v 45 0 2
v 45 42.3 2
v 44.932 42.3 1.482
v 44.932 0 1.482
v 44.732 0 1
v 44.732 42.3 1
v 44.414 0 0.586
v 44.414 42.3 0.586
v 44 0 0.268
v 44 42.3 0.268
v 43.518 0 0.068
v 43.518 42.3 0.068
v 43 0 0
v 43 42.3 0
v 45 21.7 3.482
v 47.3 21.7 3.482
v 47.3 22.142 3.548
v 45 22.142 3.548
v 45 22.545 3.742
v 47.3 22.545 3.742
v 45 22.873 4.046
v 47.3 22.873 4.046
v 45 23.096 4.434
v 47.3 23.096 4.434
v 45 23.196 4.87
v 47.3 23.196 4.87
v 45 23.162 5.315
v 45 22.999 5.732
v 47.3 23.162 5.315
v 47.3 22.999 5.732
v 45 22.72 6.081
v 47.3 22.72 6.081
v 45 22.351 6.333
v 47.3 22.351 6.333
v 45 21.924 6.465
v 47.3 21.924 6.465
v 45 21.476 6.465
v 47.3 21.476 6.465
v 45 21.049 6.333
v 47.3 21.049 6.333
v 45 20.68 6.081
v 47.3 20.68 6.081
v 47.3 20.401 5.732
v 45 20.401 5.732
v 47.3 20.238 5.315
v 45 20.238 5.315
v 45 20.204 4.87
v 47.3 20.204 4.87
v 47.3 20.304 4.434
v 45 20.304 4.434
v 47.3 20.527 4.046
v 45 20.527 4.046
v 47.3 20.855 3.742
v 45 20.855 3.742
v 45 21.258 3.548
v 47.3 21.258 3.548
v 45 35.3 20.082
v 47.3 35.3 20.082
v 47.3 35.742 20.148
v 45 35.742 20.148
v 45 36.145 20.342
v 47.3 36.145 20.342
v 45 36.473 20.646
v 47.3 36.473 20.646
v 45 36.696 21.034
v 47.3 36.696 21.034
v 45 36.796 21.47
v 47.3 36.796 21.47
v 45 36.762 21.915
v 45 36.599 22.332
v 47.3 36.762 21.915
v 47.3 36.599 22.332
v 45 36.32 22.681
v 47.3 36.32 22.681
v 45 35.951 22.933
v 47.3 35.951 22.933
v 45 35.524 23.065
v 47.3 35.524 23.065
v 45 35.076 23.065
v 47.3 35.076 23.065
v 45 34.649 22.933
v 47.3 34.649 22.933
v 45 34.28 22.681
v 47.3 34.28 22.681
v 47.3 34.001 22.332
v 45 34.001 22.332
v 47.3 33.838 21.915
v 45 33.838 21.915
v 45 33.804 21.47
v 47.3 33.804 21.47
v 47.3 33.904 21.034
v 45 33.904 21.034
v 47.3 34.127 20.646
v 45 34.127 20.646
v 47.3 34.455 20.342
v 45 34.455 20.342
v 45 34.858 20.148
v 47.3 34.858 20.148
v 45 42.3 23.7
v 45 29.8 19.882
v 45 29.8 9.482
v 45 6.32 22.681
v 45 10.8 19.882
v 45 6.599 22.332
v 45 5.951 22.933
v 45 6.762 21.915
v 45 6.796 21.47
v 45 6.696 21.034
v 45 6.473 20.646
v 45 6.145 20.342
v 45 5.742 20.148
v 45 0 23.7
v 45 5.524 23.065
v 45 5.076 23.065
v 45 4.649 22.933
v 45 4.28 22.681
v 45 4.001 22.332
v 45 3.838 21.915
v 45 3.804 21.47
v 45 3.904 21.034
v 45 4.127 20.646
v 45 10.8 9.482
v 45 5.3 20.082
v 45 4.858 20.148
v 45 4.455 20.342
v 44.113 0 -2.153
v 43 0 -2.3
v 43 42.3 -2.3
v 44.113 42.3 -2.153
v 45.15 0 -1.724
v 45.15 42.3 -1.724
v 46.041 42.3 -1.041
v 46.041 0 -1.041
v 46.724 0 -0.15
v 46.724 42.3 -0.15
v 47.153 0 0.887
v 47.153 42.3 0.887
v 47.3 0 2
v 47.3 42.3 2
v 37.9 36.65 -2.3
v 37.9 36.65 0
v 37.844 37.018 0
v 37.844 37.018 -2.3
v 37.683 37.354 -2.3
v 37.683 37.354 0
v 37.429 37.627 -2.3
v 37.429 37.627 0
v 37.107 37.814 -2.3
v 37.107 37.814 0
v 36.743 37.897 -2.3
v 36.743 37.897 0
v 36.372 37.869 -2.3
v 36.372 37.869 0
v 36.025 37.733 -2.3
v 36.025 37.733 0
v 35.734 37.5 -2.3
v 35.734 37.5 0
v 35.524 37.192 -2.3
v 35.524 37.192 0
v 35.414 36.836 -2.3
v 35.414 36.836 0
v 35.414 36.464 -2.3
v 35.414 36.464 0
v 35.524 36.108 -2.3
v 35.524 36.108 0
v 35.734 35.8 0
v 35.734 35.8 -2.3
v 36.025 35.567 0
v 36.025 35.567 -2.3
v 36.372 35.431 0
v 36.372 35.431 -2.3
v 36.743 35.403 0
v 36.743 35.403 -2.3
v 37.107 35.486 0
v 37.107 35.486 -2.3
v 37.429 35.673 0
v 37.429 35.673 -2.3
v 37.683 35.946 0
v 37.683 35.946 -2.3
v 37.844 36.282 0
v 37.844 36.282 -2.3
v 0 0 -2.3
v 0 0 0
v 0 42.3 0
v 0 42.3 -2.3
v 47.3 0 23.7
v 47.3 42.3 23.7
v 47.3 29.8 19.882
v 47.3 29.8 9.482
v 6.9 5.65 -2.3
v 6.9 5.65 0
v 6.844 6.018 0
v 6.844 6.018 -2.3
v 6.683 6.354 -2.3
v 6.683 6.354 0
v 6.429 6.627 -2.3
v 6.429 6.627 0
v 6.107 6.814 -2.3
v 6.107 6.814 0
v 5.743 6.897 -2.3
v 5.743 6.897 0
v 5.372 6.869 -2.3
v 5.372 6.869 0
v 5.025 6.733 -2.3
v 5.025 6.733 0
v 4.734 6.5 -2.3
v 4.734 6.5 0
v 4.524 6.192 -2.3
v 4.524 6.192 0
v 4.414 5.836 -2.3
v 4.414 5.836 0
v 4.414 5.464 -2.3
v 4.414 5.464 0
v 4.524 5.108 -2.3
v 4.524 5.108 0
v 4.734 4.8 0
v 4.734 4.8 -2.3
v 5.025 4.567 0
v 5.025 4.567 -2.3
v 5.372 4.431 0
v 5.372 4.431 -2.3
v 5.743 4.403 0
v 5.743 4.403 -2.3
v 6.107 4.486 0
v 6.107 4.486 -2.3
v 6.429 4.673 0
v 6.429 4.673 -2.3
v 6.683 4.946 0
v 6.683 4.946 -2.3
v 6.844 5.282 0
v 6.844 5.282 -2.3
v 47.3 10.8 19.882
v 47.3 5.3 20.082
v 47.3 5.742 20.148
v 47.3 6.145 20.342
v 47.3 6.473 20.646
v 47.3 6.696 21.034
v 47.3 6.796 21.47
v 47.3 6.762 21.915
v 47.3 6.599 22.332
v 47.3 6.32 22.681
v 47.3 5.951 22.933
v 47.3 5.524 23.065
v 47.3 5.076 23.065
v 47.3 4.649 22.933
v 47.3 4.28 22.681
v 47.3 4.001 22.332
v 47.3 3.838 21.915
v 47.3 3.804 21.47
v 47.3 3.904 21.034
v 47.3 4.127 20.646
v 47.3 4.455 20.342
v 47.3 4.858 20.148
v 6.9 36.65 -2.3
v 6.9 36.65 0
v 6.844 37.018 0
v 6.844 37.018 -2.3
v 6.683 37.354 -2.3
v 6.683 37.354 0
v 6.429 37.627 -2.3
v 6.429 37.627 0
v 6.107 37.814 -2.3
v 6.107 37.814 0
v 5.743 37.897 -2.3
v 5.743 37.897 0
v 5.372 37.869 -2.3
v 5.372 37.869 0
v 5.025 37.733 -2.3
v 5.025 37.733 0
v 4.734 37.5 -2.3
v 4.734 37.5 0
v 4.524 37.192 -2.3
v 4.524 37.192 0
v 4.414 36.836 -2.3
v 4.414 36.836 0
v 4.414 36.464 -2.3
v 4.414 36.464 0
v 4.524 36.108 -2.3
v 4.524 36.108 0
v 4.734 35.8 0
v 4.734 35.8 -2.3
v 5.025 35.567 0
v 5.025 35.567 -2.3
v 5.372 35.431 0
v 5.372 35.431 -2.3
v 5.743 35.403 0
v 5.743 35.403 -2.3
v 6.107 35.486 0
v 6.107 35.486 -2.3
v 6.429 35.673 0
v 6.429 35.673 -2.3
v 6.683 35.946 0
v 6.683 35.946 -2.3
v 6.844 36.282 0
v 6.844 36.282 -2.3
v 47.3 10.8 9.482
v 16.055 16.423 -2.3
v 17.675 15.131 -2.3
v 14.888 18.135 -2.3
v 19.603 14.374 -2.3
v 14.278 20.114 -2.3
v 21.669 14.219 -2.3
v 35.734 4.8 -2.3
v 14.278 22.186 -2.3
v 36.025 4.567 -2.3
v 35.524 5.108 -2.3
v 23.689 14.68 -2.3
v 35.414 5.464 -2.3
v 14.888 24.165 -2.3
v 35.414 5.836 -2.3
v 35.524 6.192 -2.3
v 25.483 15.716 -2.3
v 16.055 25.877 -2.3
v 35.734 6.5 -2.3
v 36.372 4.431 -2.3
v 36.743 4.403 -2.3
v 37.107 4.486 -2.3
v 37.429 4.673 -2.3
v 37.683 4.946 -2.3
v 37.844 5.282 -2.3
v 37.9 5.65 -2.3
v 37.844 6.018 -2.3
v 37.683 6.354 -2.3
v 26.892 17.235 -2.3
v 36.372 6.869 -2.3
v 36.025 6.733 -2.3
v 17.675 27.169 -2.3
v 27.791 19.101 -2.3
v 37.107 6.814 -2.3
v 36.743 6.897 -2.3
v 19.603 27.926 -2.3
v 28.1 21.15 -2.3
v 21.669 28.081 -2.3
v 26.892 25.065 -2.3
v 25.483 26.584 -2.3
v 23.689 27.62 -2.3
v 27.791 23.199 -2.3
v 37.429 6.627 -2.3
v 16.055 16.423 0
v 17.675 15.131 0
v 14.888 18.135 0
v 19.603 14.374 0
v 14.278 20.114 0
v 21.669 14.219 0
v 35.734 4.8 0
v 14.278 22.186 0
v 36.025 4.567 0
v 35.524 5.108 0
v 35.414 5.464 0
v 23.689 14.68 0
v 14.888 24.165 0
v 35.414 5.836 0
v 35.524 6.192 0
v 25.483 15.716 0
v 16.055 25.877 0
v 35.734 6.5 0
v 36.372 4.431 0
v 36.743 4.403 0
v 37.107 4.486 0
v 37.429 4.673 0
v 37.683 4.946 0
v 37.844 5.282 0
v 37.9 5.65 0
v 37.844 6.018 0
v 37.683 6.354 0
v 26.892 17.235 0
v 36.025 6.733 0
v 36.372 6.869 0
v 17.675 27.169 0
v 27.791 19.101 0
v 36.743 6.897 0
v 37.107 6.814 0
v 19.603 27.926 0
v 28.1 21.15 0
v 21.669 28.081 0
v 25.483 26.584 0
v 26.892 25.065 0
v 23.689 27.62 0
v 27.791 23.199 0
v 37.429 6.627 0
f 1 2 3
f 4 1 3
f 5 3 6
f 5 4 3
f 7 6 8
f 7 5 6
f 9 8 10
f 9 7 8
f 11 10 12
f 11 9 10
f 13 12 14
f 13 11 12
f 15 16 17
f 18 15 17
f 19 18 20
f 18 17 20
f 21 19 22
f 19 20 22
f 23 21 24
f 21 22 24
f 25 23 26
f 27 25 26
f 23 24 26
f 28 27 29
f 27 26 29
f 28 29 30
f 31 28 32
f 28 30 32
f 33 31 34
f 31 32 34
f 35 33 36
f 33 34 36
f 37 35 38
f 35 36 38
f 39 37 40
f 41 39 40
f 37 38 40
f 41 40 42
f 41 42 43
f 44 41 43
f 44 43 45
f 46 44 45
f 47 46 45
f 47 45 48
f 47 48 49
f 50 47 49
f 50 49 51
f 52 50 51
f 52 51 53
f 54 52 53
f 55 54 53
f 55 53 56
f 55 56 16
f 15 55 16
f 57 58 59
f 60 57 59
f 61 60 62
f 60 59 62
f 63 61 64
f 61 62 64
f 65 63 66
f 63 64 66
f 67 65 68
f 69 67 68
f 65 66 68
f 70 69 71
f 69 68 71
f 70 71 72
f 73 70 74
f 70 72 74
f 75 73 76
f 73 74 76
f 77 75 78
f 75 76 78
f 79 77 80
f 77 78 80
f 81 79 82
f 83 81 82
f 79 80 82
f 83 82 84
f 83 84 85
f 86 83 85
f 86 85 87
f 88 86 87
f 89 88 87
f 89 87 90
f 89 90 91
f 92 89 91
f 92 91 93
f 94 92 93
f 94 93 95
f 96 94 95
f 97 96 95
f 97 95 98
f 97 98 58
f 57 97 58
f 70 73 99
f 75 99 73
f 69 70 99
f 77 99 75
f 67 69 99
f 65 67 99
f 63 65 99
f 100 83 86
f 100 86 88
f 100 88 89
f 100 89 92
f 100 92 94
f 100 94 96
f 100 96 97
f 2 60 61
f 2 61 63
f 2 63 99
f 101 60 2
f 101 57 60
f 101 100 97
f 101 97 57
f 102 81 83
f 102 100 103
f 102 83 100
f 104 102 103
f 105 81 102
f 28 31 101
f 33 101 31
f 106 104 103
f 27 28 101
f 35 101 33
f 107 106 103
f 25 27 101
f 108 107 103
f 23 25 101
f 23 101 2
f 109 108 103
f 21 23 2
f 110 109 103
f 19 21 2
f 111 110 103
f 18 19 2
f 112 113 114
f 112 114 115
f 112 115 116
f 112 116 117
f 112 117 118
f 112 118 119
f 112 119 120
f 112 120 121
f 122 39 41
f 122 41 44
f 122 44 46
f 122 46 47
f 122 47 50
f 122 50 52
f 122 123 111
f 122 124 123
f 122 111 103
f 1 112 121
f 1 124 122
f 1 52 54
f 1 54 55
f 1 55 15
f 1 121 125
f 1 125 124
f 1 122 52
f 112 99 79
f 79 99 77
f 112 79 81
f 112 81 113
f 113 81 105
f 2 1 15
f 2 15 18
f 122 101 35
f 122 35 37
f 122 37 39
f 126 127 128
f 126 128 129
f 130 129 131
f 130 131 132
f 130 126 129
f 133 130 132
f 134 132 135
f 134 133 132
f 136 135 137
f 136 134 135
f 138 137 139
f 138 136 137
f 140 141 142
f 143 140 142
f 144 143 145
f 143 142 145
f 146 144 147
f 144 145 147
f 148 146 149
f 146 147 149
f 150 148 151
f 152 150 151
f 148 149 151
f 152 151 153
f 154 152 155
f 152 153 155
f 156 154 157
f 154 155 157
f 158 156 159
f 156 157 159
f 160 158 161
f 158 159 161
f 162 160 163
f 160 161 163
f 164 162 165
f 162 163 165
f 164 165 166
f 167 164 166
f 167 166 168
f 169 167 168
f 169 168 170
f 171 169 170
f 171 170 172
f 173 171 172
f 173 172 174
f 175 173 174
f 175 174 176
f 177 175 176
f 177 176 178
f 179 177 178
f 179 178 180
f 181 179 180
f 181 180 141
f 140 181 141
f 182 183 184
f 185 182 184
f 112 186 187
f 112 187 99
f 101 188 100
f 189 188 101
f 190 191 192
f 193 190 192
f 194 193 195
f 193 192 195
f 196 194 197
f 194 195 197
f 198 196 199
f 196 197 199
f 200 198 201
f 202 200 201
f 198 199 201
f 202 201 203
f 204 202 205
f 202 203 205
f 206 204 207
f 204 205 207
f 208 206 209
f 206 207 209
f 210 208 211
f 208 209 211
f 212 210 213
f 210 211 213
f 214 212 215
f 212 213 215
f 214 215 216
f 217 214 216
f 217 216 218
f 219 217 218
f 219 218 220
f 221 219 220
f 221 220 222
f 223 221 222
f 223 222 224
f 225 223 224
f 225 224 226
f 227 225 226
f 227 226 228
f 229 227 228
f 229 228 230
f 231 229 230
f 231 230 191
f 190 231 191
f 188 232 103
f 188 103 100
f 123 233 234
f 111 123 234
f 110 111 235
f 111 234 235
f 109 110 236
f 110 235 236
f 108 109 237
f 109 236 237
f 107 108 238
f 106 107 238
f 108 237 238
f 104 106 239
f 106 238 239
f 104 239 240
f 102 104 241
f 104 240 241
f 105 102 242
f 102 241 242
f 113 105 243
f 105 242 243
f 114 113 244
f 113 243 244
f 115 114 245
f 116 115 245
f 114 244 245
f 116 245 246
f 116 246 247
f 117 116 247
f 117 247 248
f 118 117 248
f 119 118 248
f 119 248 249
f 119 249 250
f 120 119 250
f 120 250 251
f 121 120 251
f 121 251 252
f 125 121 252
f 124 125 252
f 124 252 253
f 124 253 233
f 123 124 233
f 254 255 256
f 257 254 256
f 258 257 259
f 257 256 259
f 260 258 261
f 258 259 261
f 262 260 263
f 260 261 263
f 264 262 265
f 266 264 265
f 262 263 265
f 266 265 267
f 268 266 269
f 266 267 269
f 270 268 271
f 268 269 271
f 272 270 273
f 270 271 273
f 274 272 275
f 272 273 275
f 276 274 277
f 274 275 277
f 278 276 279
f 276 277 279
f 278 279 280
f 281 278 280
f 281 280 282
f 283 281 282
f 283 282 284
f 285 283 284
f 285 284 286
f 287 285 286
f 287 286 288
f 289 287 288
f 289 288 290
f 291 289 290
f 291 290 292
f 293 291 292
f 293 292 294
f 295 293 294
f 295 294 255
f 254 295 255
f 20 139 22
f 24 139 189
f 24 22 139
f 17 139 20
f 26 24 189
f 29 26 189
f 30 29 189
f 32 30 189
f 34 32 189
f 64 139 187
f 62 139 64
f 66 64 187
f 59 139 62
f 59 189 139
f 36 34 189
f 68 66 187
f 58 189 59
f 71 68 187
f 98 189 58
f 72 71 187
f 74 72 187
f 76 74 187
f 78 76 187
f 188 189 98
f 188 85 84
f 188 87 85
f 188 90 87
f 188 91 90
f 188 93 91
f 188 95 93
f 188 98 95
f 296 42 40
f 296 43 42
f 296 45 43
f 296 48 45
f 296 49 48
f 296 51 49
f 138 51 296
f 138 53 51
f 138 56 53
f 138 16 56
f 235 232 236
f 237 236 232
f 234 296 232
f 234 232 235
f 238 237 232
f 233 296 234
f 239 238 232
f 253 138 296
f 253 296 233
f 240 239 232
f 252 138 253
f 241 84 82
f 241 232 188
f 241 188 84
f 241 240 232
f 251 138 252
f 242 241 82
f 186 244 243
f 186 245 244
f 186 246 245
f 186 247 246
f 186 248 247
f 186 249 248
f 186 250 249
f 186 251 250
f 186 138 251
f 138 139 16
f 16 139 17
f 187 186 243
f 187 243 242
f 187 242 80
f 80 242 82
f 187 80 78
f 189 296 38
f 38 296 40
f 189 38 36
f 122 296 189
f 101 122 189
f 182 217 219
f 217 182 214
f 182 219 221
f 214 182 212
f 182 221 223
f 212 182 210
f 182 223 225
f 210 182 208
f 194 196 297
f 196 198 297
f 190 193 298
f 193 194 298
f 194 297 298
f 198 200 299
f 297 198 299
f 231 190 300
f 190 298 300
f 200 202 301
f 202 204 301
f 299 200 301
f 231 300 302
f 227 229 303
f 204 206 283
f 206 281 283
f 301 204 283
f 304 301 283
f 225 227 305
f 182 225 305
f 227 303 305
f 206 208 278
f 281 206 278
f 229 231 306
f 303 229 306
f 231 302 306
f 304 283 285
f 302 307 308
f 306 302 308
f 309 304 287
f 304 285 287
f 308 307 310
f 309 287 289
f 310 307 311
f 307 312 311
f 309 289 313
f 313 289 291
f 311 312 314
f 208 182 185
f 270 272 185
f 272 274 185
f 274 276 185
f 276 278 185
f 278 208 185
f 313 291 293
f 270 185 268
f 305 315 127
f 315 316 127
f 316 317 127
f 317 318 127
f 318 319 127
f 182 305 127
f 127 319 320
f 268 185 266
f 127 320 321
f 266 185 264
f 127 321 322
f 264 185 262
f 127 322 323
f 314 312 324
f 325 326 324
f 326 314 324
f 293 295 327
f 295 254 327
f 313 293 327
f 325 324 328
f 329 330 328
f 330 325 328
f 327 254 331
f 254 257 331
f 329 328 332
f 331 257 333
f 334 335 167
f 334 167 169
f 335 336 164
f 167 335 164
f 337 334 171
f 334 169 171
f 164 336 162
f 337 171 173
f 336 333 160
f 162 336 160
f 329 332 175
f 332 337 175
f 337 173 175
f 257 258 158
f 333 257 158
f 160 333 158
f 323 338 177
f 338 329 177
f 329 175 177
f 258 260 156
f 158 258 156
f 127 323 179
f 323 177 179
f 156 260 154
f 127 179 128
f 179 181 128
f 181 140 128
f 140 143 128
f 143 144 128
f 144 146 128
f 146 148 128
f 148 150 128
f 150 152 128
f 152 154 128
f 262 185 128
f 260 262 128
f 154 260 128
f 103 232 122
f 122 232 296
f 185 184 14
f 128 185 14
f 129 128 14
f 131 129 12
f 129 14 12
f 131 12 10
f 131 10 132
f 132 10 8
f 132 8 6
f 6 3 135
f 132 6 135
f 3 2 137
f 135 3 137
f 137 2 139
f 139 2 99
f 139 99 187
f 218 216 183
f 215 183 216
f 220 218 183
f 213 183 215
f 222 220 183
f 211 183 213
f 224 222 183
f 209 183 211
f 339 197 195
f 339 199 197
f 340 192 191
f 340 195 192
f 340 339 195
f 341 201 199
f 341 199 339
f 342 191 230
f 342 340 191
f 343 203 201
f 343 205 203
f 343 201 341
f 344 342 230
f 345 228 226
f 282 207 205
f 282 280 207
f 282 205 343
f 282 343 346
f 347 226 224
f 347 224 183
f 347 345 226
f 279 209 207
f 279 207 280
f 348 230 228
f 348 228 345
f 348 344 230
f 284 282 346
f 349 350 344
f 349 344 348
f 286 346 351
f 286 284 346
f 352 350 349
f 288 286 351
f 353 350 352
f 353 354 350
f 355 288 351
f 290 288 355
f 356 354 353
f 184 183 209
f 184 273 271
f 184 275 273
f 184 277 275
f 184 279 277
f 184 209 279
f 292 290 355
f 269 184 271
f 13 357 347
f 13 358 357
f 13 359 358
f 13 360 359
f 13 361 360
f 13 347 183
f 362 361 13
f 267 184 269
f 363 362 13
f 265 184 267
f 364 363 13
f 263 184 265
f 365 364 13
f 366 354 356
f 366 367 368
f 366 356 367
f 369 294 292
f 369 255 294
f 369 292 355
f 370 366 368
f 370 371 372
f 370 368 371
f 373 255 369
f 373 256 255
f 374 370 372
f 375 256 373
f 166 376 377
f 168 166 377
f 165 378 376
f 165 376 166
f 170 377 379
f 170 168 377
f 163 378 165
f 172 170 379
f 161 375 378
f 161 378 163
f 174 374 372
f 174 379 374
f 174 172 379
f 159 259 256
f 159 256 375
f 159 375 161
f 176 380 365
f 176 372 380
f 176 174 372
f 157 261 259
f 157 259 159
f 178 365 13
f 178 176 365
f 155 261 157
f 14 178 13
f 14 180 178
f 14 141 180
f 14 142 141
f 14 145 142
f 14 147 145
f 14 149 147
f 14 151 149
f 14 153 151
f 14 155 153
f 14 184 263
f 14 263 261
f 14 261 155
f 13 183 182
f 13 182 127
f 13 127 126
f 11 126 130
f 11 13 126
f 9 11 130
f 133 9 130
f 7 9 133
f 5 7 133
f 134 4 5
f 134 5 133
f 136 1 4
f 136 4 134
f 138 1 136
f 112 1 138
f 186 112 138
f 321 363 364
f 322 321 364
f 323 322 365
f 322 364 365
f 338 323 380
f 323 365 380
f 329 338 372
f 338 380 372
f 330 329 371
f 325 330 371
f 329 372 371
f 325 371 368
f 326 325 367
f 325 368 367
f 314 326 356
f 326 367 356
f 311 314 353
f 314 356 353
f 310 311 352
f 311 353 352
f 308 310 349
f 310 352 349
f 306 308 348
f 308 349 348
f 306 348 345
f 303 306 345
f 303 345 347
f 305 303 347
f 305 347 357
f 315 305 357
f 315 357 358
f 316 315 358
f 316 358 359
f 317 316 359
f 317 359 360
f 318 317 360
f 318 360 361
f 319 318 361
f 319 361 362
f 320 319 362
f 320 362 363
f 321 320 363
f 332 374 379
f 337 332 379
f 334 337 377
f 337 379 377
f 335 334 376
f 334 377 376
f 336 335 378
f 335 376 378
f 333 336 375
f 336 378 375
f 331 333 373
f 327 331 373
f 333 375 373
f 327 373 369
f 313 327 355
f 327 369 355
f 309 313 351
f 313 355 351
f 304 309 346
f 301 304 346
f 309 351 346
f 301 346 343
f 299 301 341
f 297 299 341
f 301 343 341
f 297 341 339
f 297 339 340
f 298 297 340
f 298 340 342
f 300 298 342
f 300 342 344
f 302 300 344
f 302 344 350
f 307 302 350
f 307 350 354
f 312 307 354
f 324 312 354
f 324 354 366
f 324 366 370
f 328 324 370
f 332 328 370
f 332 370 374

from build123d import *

# Parameters (mm, degrees)
SKETCH1_W                    = 47.3
SKETCH1_H                    = 42.3
BASE_FLANGE1_DEPTH           = 2.3
EDGE_FLANGE1_STRIP_W         = 13.2
EDGE_FLANGE1_STRIP_H         = 2.3
EDGE_FLANGE1_STRIP_CUT_DEPTH = 42.3
EDGE_FLANGE1_DEPTH           = 42.3
SKETCH9_W                    = 10.4
SKETCH9_H                    = 19
CUT_EXTRUDE1_DEPTH           = 3
SKETCH10_R                   = 1.5
CUT_EXTRUDE2_DEPTH           = 3
SKETCH11_R                   = 1.25
CUT_EXTRUDE5_DEPTH           = 3
SKETCH22_R                   = 6.95
CUT_EXTRUDE6_DEPTH           = 3


# Sheet-metal steps are written as plain solids
with BuildPart() as part:
    # Sketch1 → Base-Flange1 (new body)
    with BuildSketch(Plane.XY):
        with Locations((23.65, 21.15)):
            Rectangle(SKETCH1_W, SKETCH1_H)
    extrude(amount=-BASE_FLANGE1_DEPTH)

    # Edge-Flange1 strip (across the edge) → Edge-Flange1 strip cut (cut)
    with BuildSketch(Plane(origin=(47.3, 0, 0), x_dir=(-1, 0, 0), z_dir=(0, 1, 0))):
        with Locations((-2.3, -1.15)):
            Rectangle(EDGE_FLANGE1_STRIP_W, EDGE_FLANGE1_STRIP_H)
    extrude(amount=EDGE_FLANGE1_STRIP_CUT_DEPTH, mode=Mode.SUBTRACT)

    # Edge-Flange1 section (across the edge) → Edge-Flange1 (add)
    with BuildSketch(Plane(origin=(47.3, 0, 0), x_dir=(-1, 0, 0), z_dir=(0, 1, 0))):
        with BuildLine():
            Line((0, 2), (0, 23.7))
            Line((0, 23.7), (2.3, 23.7))
            Line((2.3, 23.7), (2.3, 2))
            ThreePointArc((2.3, 2), (2.885786438, 0.585786438), (4.3, 0))
            Line((4.3, 0), (4.3, -2.3))
            ThreePointArc((4.3, -2.3), (1.259440841, -1.040559159), (0, 2))
        make_face()
    extrude(amount=EDGE_FLANGE1_DEPTH)

    # Sketch9 → Cut-Extrude1 (cut)
    with BuildSketch(Plane(origin=(47.3, -232.998028616, -457.703147412), x_dir=(0, 0, -1), z_dir=(1, 0, 0))):
        with Locations((-472.38476551, 253.298028616)):
            Rectangle(SKETCH9_W, SKETCH9_H)
    extrude(amount=-CUT_EXTRUDE1_DEPTH, mode=Mode.SUBTRACT)

    # Sketch10 → Cut-Extrude2 (cut)
    with BuildSketch(Plane(origin=(47.3, -232.998028616, -457.703147412), x_dir=(0, 0, -1), z_dir=(1, 0, 0))):
        with Locations((-479.28476551, 268.298028616)):
            Circle(SKETCH10_R)
        with Locations((-462.68476551, 254.698028616)):
            Circle(SKETCH10_R)
        with Locations((-479.28476551, 238.298028616)):
            Circle(SKETCH10_R)
    extrude(amount=-CUT_EXTRUDE2_DEPTH, mode=Mode.SUBTRACT)

    # Sketch11 → Cut-Extrude5 (cut)
    with BuildSketch(Plane.XY):
        with Locations((5.65, 5.65)):
            Circle(SKETCH11_R)
        with Locations((5.65, 36.65)):
            Circle(SKETCH11_R)
        with Locations((36.65, 5.65)):
            Circle(SKETCH11_R)
        with Locations((36.65, 36.65)):
            Circle(SKETCH11_R)
    extrude(amount=-CUT_EXTRUDE5_DEPTH, mode=Mode.SUBTRACT)

    # Sketch22 → Cut-Extrude6 (cut)
    with BuildSketch(Plane.XY):
        with Locations((21.15, 21.15)):
            Circle(SKETCH22_R)
    extrude(amount=-CUT_EXTRUDE6_DEPTH, mode=Mode.SUBTRACT)


solid = part.part
